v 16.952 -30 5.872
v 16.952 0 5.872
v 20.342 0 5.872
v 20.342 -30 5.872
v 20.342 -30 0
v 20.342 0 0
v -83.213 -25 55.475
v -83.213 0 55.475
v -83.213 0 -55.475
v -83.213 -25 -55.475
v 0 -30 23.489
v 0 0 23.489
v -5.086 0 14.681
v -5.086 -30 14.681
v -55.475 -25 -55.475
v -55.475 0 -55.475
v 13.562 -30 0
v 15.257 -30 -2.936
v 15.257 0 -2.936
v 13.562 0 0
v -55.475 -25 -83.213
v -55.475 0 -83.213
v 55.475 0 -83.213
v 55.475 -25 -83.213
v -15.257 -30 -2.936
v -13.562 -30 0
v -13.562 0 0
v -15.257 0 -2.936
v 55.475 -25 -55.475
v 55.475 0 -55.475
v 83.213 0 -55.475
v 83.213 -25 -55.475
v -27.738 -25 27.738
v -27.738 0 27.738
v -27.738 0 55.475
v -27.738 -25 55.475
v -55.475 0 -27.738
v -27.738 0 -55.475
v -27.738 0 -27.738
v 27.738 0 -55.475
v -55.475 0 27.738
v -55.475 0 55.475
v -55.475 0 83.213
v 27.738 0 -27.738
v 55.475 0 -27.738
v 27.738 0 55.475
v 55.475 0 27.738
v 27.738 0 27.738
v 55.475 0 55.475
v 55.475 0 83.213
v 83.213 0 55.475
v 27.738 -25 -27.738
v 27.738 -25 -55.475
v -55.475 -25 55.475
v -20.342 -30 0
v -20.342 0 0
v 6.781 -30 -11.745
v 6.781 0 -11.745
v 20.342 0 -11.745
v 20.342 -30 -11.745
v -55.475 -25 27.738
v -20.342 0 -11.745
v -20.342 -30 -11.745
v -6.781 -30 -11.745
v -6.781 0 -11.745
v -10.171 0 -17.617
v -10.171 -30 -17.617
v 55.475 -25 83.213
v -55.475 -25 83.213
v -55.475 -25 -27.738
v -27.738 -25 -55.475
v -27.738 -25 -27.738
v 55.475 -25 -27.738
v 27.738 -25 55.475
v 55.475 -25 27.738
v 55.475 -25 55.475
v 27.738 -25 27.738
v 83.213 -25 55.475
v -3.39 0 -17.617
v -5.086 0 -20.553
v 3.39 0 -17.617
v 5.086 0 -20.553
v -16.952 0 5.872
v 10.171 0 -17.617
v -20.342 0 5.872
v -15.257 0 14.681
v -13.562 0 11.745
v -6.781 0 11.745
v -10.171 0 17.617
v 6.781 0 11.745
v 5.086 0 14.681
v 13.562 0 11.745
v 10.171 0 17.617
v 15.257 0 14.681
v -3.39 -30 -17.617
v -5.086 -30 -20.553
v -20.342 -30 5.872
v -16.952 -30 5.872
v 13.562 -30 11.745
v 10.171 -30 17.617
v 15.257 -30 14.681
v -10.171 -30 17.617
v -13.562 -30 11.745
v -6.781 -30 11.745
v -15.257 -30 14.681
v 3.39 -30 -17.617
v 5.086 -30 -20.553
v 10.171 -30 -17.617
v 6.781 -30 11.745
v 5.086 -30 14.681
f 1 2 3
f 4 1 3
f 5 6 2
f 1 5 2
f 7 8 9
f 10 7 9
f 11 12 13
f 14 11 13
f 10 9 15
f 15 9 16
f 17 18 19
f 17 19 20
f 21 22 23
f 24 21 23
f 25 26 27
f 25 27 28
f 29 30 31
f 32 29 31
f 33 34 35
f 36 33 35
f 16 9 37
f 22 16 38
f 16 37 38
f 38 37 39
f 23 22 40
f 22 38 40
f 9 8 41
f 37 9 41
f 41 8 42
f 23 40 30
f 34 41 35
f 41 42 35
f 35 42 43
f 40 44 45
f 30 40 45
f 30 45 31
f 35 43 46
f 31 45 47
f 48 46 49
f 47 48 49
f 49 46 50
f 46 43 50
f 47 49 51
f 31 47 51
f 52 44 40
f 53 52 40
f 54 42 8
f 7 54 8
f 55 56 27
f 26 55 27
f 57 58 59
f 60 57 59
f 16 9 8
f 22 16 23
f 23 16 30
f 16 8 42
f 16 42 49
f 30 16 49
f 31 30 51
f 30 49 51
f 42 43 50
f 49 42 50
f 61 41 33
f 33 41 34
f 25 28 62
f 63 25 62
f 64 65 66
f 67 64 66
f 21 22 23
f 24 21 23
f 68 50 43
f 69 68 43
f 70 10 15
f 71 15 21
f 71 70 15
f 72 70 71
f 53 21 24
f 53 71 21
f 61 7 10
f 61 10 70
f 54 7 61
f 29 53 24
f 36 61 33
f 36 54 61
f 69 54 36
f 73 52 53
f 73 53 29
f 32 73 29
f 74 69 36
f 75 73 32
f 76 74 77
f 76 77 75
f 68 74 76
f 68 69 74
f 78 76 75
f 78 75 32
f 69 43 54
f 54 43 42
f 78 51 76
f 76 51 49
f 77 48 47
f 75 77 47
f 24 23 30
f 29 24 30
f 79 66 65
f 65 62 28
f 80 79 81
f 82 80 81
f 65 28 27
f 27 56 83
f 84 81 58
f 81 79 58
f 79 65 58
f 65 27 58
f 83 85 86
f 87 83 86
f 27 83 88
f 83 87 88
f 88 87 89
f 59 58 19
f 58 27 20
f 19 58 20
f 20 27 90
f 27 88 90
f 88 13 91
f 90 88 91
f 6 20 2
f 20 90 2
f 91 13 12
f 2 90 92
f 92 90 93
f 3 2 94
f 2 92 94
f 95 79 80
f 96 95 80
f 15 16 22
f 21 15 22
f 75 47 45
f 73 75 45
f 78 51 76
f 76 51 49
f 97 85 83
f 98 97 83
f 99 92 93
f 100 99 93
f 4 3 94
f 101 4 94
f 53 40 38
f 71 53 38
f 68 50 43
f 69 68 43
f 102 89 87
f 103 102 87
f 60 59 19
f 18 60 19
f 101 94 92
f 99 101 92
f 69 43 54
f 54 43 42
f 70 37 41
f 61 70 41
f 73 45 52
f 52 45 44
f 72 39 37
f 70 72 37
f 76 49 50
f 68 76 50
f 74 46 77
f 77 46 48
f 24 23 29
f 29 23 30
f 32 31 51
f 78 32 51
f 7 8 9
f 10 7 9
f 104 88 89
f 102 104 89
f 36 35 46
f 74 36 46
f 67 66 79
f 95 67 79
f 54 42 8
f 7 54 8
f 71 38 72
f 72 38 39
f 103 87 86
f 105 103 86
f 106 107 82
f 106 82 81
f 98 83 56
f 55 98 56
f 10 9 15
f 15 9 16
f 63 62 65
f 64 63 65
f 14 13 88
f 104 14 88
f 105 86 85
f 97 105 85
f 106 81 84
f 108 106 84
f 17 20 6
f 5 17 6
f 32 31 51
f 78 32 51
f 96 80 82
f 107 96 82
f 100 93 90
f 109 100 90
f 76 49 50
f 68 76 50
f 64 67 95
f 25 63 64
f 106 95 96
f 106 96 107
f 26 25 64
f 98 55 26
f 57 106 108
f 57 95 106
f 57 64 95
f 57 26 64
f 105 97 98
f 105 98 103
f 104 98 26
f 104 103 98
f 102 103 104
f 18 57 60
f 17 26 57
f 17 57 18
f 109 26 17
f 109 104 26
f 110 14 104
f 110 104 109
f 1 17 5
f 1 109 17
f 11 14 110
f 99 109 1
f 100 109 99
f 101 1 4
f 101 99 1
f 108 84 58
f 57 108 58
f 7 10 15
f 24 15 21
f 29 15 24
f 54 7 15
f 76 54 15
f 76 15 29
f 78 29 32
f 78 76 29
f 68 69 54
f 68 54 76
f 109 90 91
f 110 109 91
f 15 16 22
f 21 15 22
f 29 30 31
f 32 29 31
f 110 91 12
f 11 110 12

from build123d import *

# Parameters (mm, degrees)
F1_DEPTH = 30
F3_DEPTH = 25
F4_DEPTH = 25
F6_DEPTH = 25


with BuildPart() as f1:
    # F0 (on Front) → F1 (new body)
    with BuildSketch(Plane.XZ):
        Polygon((5.085602828, 14.6808708087), (0, 23.4893932939), (-5.085602828, 14.6808708087), (0, 5.8723483235), align=None)
        Polygon((6.7808037707, 11.7446966469), (5.085602828, 14.6808708087), (0, 5.8723483235), (3.3904018853, 5.8723483235), align=None)
        Polygon((10.171205656, 5.8723483235), (6.7808037707, 11.7446966469), (3.3904018853, 5.8723483235), align=None)
        Polygon((10.171205656, 17.6170449704), (6.7808037707, 11.7446966469), (10.171205656, 5.8723483235), (13.5616075413, 11.7446966469), align=None)
        Polygon((13.5616075413, 11.7446966469), (10.171205656, 5.8723483235), (16.9520094266, 5.8723483235), align=None)
        Polygon((15.256808484, 14.6808708087), (13.5616075413, 11.7446966469), (16.9520094266, 5.8723483235), (20.342411312, 5.8723483235), align=None)
        Polygon((16.9520094266, 5.8723483235), (10.171205656, 5.8723483235), (13.5616075413, 0), (20.342411312, 0), align=None)
        Polygon((13.5616075413, 0), (10.171205656, 5.8723483235), (6.7808037707, 0), align=None)
        Polygon((10.171205656, 5.8723483235), (3.3904018853, 5.8723483235), (0, 0), (6.7808037707, 0), align=None)
        Polygon((0, 5.8723483235), (-5.085602828, 14.6808708087), (-6.7808037707, 11.7446966469), (-3.3904018853, 5.8723483235), align=None)
        Polygon((-3.3904018853, 5.8723483235), (-6.7808037707, 11.7446966469), (-10.171205656, 5.8723483235), align=None)
        Polygon((-10.171205656, 5.8723483235), (-6.7808037707, 11.7446966469), (-10.171205656, 17.6170449704), (-13.5616075413, 11.7446966469), align=None)
        Polygon((-16.9520094266, 5.8723483235), (-13.5616075413, 11.7446966469), (-15.256808484, 14.6808708087), (-20.342411312, 5.8723483235), align=None)
        Polygon((-16.9520094266, 5.8723483235), (-10.171205656, 5.8723483235), (-13.5616075413, 11.7446966469), align=None)
        Polygon((-13.5616075413, 0), (-10.171205656, 5.8723483235), (-16.9520094266, 5.8723483235), (-20.342411312, 0), align=None)
        Polygon((-6.7808037707, 0), (-10.171205656, 5.8723483235), (-13.5616075413, 0), align=None)
        Polygon((0, 0), (-3.3904018853, 5.8723483235), (-10.171205656, 5.8723483235), (-6.7808037707, 0), align=None)
        Polygon((3.3904018853, 5.8723483235), (0, 5.8723483235), (-3.3904018853, 5.8723483235), (0, 0), align=None)
        Polygon((15.256808484, -2.9361741617), (13.5616075413, 0), (6.7808037707, 0), (5.085602828, -2.9361741617), align=None)
        Polygon((20.342411312, -11.7446966469), (15.256808484, -2.9361741617), (5.085602828, -2.9361741617), (10.171205656, -11.7446966469), align=None)
        Polygon((5.085602828, -2.9361741617), (3.3904018853, -5.8723483235), (6.7808037707, -11.7446966469), (10.171205656, -11.7446966469), align=None)
        Polygon((6.7808037707, -11.7446966469), (3.3904018853, -5.8723483235), (0, -11.7446966469), align=None)
        Polygon((3.3904018853, -5.8723483235), (0, 0), (-3.3904018853, -5.8723483235), (0, -11.7446966469), align=None)
        Polygon((6.7808037707, 0), (0, 0), (3.3904018853, -5.8723483235), (5.085602828, -2.9361741617), align=None)
        Polygon((-3.3904018853, -5.8723483235), (0, 0), (-6.7808037707, 0), (-5.085602828, -2.9361741617), align=None)
        Polygon((-6.7808037707, -11.7446966469), (-3.3904018853, -5.8723483235), (-5.085602828, -2.9361741617), (-10.171205656, -11.7446966469), align=None)
        Polygon((-5.085602828, -2.9361741617), (-6.7808037707, 0), (-13.5616075413, 0), (-15.256808484, -2.9361741617), align=None)
        Polygon((-10.171205656, -11.7446966469), (-5.085602828, -2.9361741617), (-15.256808484, -2.9361741617), (-20.342411312, -11.7446966469), align=None)
        Polygon((0, -11.7446966469), (-3.3904018853, -5.8723483235), (-6.7808037707, -11.7446966469), align=None)
        Polygon((-3.3904018853, -17.6170449704), (0, -11.7446966469), (-6.7808037707, -11.7446966469), (-10.171205656, -17.6170449704), align=None)
        Polygon((3.3904018853, -17.6170449704), (0, -11.7446966469), (-3.3904018853, -17.6170449704), align=None)
        Polygon((10.171205656, -17.6170449704), (6.7808037707, -11.7446966469), (0, -11.7446966469), (3.3904018853, -17.6170449704), align=None)
        Polygon((5.085602828, -20.5532191321), (3.3904018853, -17.6170449704), (-3.3904018853, -17.6170449704), (-5.085602828, -20.5532191321), align=None)
    extrude(amount=F1_DEPTH)


with BuildPart() as f3:
    # F2 (on Front) → F3 (new body)
    with BuildSketch(Plane.XZ):
        Polygon((27.7376268059, 83.2128804177), (0, 55.4752536118), (27.7376268059, 55.4752536118), align=None)
        Polygon((0, 83.2128804177), (0, 55.4752536118), (27.7376268059, 83.2128804177), align=None)
        Polygon((-27.7376268059, 55.4752536118), (0, 55.4752536118), (-27.7376268059, 83.2128804177), align=None)
        Polygon((-27.7376268059, 83.2128804177), (0, 55.4752536118), (0, 83.2128804177), align=None)
        Polygon((27.7376268059, 55.4752536118), (27.7376268059, 27.7376268059), (55.4752536118, 55.4752536118), align=None)
        Polygon((55.4752536118, 55.4752536118), (27.7376268059, 27.7376268059), (55.4752536118, 27.7376268059), align=None)
        Polygon((-55.4752536118, 27.7376268059), (-27.7376268059, 27.7376268059), (-55.4752536118, 55.4752536118), align=None)
        Polygon((-55.4752536118, 55.4752536118), (-27.7376268059, 27.7376268059), (-27.7376268059, 55.4752536118), align=None)
        Polygon((27.7376268059, 83.2128804177), (27.7376268059, 55.4752536118), (55.4752536118, 55.4752536118), align=None)
        Polygon((-55.4752536118, 55.4752536118), (-27.7376268059, 55.4752536118), (-27.7376268059, 83.2128804177), align=None)
        Polygon((55.4752536118, 83.2128804177), (27.7376268059, 83.2128804177), (55.4752536118, 55.4752536118), align=None)
        Polygon((-55.4752536118, 55.4752536118), (-27.7376268059, 83.2128804177), (-55.4752536118, 83.2128804177), align=None)
        Polygon((83.2128804177, -27.7376268059), (55.4752536118, 0), (55.4752536118, -27.7376268059), align=None)
        Polygon((55.4752536118, 27.7376268059), (55.4752536118, 0), (83.2128804177, 27.7376268059), align=None)
        Polygon((83.2128804177, 0), (55.4752536118, 0), (83.2128804177, -27.7376268059), align=None)
        Polygon((83.2128804177, 27.7376268059), (55.4752536118, 0), (83.2128804177, 0), align=None)
        Polygon((83.2128804177, 27.7376268059), (55.4752536118, 55.4752536118), (55.4752536118, 27.7376268059), align=None)
        Polygon((83.2128804177, 55.4752536118), (55.4752536118, 55.4752536118), (83.2128804177, 27.7376268059), align=None)
        Polygon((-83.2128804177, 27.7376268059), (-55.4752536118, 0), (-55.4752536118, 27.7376268059), align=None)
        Polygon((-55.4752536118, -27.7376268059), (-55.4752536118, 0), (-83.2128804177, -27.7376268059), align=None)
        Polygon((-83.2128804177, 0), (-55.4752536118, 0), (-83.2128804177, 27.7376268059), align=None)
        Polygon((-83.2128804177, -27.7376268059), (-55.4752536118, 0), (-83.2128804177, 0), align=None)
        Polygon((-55.4752536118, 27.7376268059), (-55.4752536118, 55.4752536118), (-83.2128804177, 27.7376268059), align=None)
        Polygon((-83.2128804177, 27.7376268059), (-55.4752536118, 55.4752536118), (-83.2128804177, 55.4752536118), align=None)
        Polygon((55.4752536118, -27.7376268059), (27.7376268059, -27.7376268059), (55.4752536118, -55.4752536118), align=None)
        Polygon((55.4752536118, -55.4752536118), (27.7376268059, -27.7376268059), (27.7376268059, -55.4752536118), align=None)
        Polygon((83.2128804177, -27.7376268059), (55.4752536118, -27.7376268059), (55.4752536118, -55.4752536118), align=None)
        Polygon((83.2128804177, -55.4752536118), (83.2128804177, -27.7376268059), (55.4752536118, -55.4752536118), align=None)
        Polygon((-27.7376268059, -55.4752536118), (-27.7376268059, -27.7376268059), (-55.4752536118, -55.4752536118), align=None)
        Polygon((-55.4752536118, -55.4752536118), (-27.7376268059, -27.7376268059), (-55.4752536118, -27.7376268059), align=None)
        Polygon((-55.4752536118, -55.4752536118), (-55.4752536118, -27.7376268059), (-83.2128804177, -27.7376268059), align=None)
        Polygon((-55.4752536118, -55.4752536118), (-83.2128804177, -27.7376268059), (-83.2128804177, -55.4752536118), align=None)
        Polygon((-27.7376268059, -83.2128804177), (0, -55.4752536118), (-27.7376268059, -55.4752536118), align=None)
        Polygon((27.7376268059, -55.4752536118), (0, -55.4752536118), (27.7376268059, -83.2128804177), align=None)
        Polygon((0, -83.2128804177), (0, -55.4752536118), (-27.7376268059, -83.2128804177), align=None)
        Polygon((27.7376268059, -83.2128804177), (0, -55.4752536118), (0, -83.2128804177), align=None)
        Polygon((27.7376268059, -83.2128804177), (55.4752536118, -55.4752536118), (27.7376268059, -55.4752536118), align=None)
        Polygon((55.4752536118, -83.2128804177), (55.4752536118, -55.4752536118), (27.7376268059, -83.2128804177), align=None)
        Polygon((-27.7376268059, -55.4752536118), (-55.4752536118, -55.4752536118), (-27.7376268059, -83.2128804177), align=None)
        Polygon((-27.7376268059, -83.2128804177), (-55.4752536118, -55.4752536118), (-55.4752536118, -83.2128804177), align=None)
    extrude(amount=F3_DEPTH)


with BuildPart() as f4:
    # F0 (on Front) → F4 (new body)
    with BuildSketch(Plane.XZ):
        Polygon((5.085602828, 14.6808708087), (0, 23.4893932939), (-5.085602828, 14.6808708087), (0, 5.8723483235), align=None)
        Polygon((6.7808037707, 11.7446966469), (5.085602828, 14.6808708087), (0, 5.8723483235), (3.3904018853, 5.8723483235), align=None)
        Polygon((0, 5.8723483235), (-5.085602828, 14.6808708087), (-6.7808037707, 11.7446966469), (-3.3904018853, 5.8723483235), align=None)
        Polygon((10.171205656, 5.8723483235), (6.7808037707, 11.7446966469), (3.3904018853, 5.8723483235), align=None)
        Polygon((10.171205656, 17.6170449704), (6.7808037707, 11.7446966469), (10.171205656, 5.8723483235), (13.5616075413, 11.7446966469), align=None)
        Polygon((-10.171205656, 5.8723483235), (-6.7808037707, 11.7446966469), (-10.171205656, 17.6170449704), (-13.5616075413, 11.7446966469), align=None)
        Polygon((-3.3904018853, 5.8723483235), (-6.7808037707, 11.7446966469), (-10.171205656, 5.8723483235), align=None)
        Polygon((16.9520094266, 5.8723483235), (10.171205656, 5.8723483235), (13.5616075413, 0), (20.342411312, 0), align=None)
        Polygon((13.5616075413, 0), (10.171205656, 5.8723483235), (6.7808037707, 0), align=None)
        Polygon((13.5616075413, 11.7446966469), (10.171205656, 5.8723483235), (16.9520094266, 5.8723483235), align=None)
        Polygon((-13.5616075413, 0), (-10.171205656, 5.8723483235), (-16.9520094266, 5.8723483235), (-20.342411312, 0), align=None)
        Polygon((-16.9520094266, 5.8723483235), (-10.171205656, 5.8723483235), (-13.5616075413, 11.7446966469), align=None)
        Polygon((-6.7808037707, 0), (-10.171205656, 5.8723483235), (-13.5616075413, 0), align=None)
        Polygon((15.256808484, 14.6808708087), (13.5616075413, 11.7446966469), (16.9520094266, 5.8723483235), (20.342411312, 5.8723483235), align=None)
        Polygon((15.256808484, -2.9361741617), (13.5616075413, 0), (6.7808037707, 0), (5.085602828, -2.9361741617), align=None)
        Polygon((-16.9520094266, 5.8723483235), (-13.5616075413, 11.7446966469), (-15.256808484, 14.6808708087), (-20.342411312, 5.8723483235), align=None)
        Polygon((-5.085602828, -2.9361741617), (-6.7808037707, 0), (-13.5616075413, 0), (-15.256808484, -2.9361741617), align=None)
        Polygon((5.085602828, -2.9361741617), (3.3904018853, -5.8723483235), (6.7808037707, -11.7446966469), (10.171205656, -11.7446966469), align=None)
        Polygon((6.7808037707, -11.7446966469), (3.3904018853, -5.8723483235), (0, -11.7446966469), align=None)
        Polygon((0, -11.7446966469), (-3.3904018853, -5.8723483235), (-6.7808037707, -11.7446966469), align=None)
        Polygon((-6.7808037707, -11.7446966469), (-3.3904018853, -5.8723483235), (-5.085602828, -2.9361741617), (-10.171205656, -11.7446966469), align=None)
        Polygon((20.342411312, -11.7446966469), (15.256808484, -2.9361741617), (5.085602828, -2.9361741617), (10.171205656, -11.7446966469), align=None)
        Polygon((-10.171205656, -11.7446966469), (-5.085602828, -2.9361741617), (-15.256808484, -2.9361741617), (-20.342411312, -11.7446966469), align=None)
        Polygon((10.171205656, -17.6170449704), (6.7808037707, -11.7446966469), (0, -11.7446966469), (3.3904018853, -17.6170449704), align=None)
        Polygon((-3.3904018853, -17.6170449704), (0, -11.7446966469), (-6.7808037707, -11.7446966469), (-10.171205656, -17.6170449704), align=None)
        Polygon((3.3904018853, -17.6170449704), (0, -11.7446966469), (-3.3904018853, -17.6170449704), align=None)
        Polygon((5.085602828, -20.5532191321), (3.3904018853, -17.6170449704), (-3.3904018853, -17.6170449704), (-5.085602828, -20.5532191321), align=None)
    extrude(amount=F4_DEPTH)


with BuildPart() as f6:
    # F2 (on Front) → F6 (new body)
    with BuildSketch(Plane.XZ):
        Polygon((-55.4752536118, 55.4752536118), (-27.7376268059, 83.2128804177), (-55.4752536118, 83.2128804177), align=None)
        Polygon((-55.4752536118, 55.4752536118), (-27.7376268059, 55.4752536118), (-27.7376268059, 83.2128804177), align=None)
        Polygon((-27.7376268059, 55.4752536118), (0, 55.4752536118), (-27.7376268059, 83.2128804177), align=None)
        Polygon((-27.7376268059, 83.2128804177), (0, 55.4752536118), (0, 83.2128804177), align=None)
        Polygon((0, 83.2128804177), (0, 55.4752536118), (27.7376268059, 83.2128804177), align=None)
        Polygon((27.7376268059, 83.2128804177), (0, 55.4752536118), (27.7376268059, 55.4752536118), align=None)
        Polygon((27.7376268059, 83.2128804177), (27.7376268059, 55.4752536118), (55.4752536118, 55.4752536118), align=None)
        Polygon((55.4752536118, 83.2128804177), (27.7376268059, 83.2128804177), (55.4752536118, 55.4752536118), align=None)
        Polygon((83.2128804177, 55.4752536118), (55.4752536118, 55.4752536118), (83.2128804177, 27.7376268059), align=None)
        Polygon((83.2128804177, 27.7376268059), (55.4752536118, 55.4752536118), (55.4752536118, 27.7376268059), align=None)
        Polygon((55.4752536118, 55.4752536118), (27.7376268059, 27.7376268059), (55.4752536118, 27.7376268059), align=None)
        Polygon((27.7376268059, 55.4752536118), (27.7376268059, 27.7376268059), (55.4752536118, 55.4752536118), align=None)
        Polygon((27.7376268059, 55.4752536118), (0, 55.4752536118), (27.7376268059, 27.7376268059), align=None)
        Polygon((27.7376268059, 27.7376268059), (0, 55.4752536118), (0, 27.7376268059), align=None)
        Polygon((0, 27.7376268059), (0, 55.4752536118), (-27.7376268059, 27.7376268059), align=None)
        Polygon((-27.7376268059, 27.7376268059), (0, 55.4752536118), (-27.7376268059, 55.4752536118), align=None)
        Polygon((-55.4752536118, 55.4752536118), (-27.7376268059, 27.7376268059), (-27.7376268059, 55.4752536118), align=None)
        Polygon((-55.4752536118, 27.7376268059), (-27.7376268059, 27.7376268059), (-55.4752536118, 55.4752536118), align=None)
        Polygon((-55.4752536118, 27.7376268059), (-55.4752536118, 55.4752536118), (-83.2128804177, 27.7376268059), align=None)
        Polygon((-83.2128804177, 27.7376268059), (-55.4752536118, 55.4752536118), (-83.2128804177, 55.4752536118), align=None)
        Polygon((-83.2128804177, 0), (-55.4752536118, 0), (-83.2128804177, 27.7376268059), align=None)
        Polygon((-83.2128804177, 27.7376268059), (-55.4752536118, 0), (-55.4752536118, 27.7376268059), align=None)
        Polygon((-55.4752536118, 0), (-27.7376268059, 27.7376268059), (-55.4752536118, 27.7376268059), align=None)
        Polygon((-27.7376268059, 0), (-27.7376268059, 27.7376268059), (-55.4752536118, 0), align=None)
        Polygon((0, 0), (-27.7376268059, 27.7376268059), (-27.7376268059, 0), align=None)
        Polygon((0, 27.7376268059), (-27.7376268059, 27.7376268059), (0, 0), align=None)
        Polygon((0, 0), (27.7376268059, 27.7376268059), (0, 27.7376268059), align=None)
        Polygon((27.7376268059, 0), (27.7376268059, 27.7376268059), (0, 0), align=None)
        Polygon((55.4752536118, 0), (27.7376268059, 27.7376268059), (27.7376268059, 0), align=None)
        Polygon((55.4752536118, 27.7376268059), (27.7376268059, 27.7376268059), (55.4752536118, 0), align=None)
        Polygon((55.4752536118, 27.7376268059), (55.4752536118, 0), (83.2128804177, 27.7376268059), align=None)
        Polygon((83.2128804177, 27.7376268059), (55.4752536118, 0), (83.2128804177, 0), align=None)
        Polygon((83.2128804177, 0), (55.4752536118, 0), (83.2128804177, -27.7376268059), align=None)
        Polygon((83.2128804177, -27.7376268059), (55.4752536118, 0), (55.4752536118, -27.7376268059), align=None)
        Polygon((55.4752536118, -27.7376268059), (55.4752536118, 0), (27.7376268059, -27.7376268059), align=None)
        Polygon((27.7376268059, -27.7376268059), (55.4752536118, 0), (27.7376268059, 0), align=None)
        Polygon((27.7376268059, 0), (0, 0), (27.7376268059, -27.7376268059), align=None)
        Polygon((27.7376268059, -27.7376268059), (0, 0), (0, -27.7376268059), align=None)
        Polygon((0, -27.7376268059), (0, 0), (-27.7376268059, -27.7376268059), align=None)
        Polygon((-27.7376268059, -27.7376268059), (0, 0), (-27.7376268059, 0), align=None)
        Polygon((-27.7376268059, 0), (-55.4752536118, 0), (-27.7376268059, -27.7376268059), align=None)
        Polygon((-27.7376268059, -27.7376268059), (-55.4752536118, 0), (-55.4752536118, -27.7376268059), align=None)
        Polygon((-55.4752536118, -27.7376268059), (-55.4752536118, 0), (-83.2128804177, -27.7376268059), align=None)
        Polygon((-83.2128804177, -27.7376268059), (-55.4752536118, 0), (-83.2128804177, 0), align=None)
        Polygon((-55.4752536118, -55.4752536118), (-55.4752536118, -27.7376268059), (-83.2128804177, -27.7376268059), align=None)
        Polygon((-55.4752536118, -55.4752536118), (-83.2128804177, -27.7376268059), (-83.2128804177, -55.4752536118), align=None)
        Polygon((-55.4752536118, -55.4752536118), (-27.7376268059, -27.7376268059), (-55.4752536118, -27.7376268059), align=None)
        Polygon((-27.7376268059, -55.4752536118), (-27.7376268059, -27.7376268059), (-55.4752536118, -55.4752536118), align=None)
        Polygon((0, -55.4752536118), (-27.7376268059, -27.7376268059), (-27.7376268059, -55.4752536118), align=None)
        Polygon((0, -55.4752536118), (0, -27.7376268059), (-27.7376268059, -27.7376268059), align=None)
        Polygon((0, -55.4752536118), (27.7376268059, -27.7376268059), (0, -27.7376268059), align=None)
        Polygon((27.7376268059, -55.4752536118), (27.7376268059, -27.7376268059), (0, -55.4752536118), align=None)
        Polygon((55.4752536118, -55.4752536118), (27.7376268059, -27.7376268059), (27.7376268059, -55.4752536118), align=None)
        Polygon((55.4752536118, -27.7376268059), (27.7376268059, -27.7376268059), (55.4752536118, -55.4752536118), align=None)
        Polygon((83.2128804177, -27.7376268059), (55.4752536118, -27.7376268059), (55.4752536118, -55.4752536118), align=None)
        Polygon((83.2128804177, -55.4752536118), (83.2128804177, -27.7376268059), (55.4752536118, -55.4752536118), align=None)
        Polygon((55.4752536118, -83.2128804177), (55.4752536118, -55.4752536118), (27.7376268059, -83.2128804177), align=None)
        Polygon((27.7376268059, -83.2128804177), (55.4752536118, -55.4752536118), (27.7376268059, -55.4752536118), align=None)
        Polygon((27.7376268059, -55.4752536118), (0, -55.4752536118), (27.7376268059, -83.2128804177), align=None)
        Polygon((27.7376268059, -83.2128804177), (0, -55.4752536118), (0, -83.2128804177), align=None)
        Polygon((0, -83.2128804177), (0, -55.4752536118), (-27.7376268059, -83.2128804177), align=None)
        Polygon((-27.7376268059, -83.2128804177), (0, -55.4752536118), (-27.7376268059, -55.4752536118), align=None)
        Polygon((-27.7376268059, -55.4752536118), (-55.4752536118, -55.4752536118), (-27.7376268059, -83.2128804177), align=None)
        Polygon((-27.7376268059, -83.2128804177), (-55.4752536118, -55.4752536118), (-55.4752536118, -83.2128804177), align=None)
    extrude(amount=F6_DEPTH)


solid = Compound([f1.part, f3.part, f6.part])
